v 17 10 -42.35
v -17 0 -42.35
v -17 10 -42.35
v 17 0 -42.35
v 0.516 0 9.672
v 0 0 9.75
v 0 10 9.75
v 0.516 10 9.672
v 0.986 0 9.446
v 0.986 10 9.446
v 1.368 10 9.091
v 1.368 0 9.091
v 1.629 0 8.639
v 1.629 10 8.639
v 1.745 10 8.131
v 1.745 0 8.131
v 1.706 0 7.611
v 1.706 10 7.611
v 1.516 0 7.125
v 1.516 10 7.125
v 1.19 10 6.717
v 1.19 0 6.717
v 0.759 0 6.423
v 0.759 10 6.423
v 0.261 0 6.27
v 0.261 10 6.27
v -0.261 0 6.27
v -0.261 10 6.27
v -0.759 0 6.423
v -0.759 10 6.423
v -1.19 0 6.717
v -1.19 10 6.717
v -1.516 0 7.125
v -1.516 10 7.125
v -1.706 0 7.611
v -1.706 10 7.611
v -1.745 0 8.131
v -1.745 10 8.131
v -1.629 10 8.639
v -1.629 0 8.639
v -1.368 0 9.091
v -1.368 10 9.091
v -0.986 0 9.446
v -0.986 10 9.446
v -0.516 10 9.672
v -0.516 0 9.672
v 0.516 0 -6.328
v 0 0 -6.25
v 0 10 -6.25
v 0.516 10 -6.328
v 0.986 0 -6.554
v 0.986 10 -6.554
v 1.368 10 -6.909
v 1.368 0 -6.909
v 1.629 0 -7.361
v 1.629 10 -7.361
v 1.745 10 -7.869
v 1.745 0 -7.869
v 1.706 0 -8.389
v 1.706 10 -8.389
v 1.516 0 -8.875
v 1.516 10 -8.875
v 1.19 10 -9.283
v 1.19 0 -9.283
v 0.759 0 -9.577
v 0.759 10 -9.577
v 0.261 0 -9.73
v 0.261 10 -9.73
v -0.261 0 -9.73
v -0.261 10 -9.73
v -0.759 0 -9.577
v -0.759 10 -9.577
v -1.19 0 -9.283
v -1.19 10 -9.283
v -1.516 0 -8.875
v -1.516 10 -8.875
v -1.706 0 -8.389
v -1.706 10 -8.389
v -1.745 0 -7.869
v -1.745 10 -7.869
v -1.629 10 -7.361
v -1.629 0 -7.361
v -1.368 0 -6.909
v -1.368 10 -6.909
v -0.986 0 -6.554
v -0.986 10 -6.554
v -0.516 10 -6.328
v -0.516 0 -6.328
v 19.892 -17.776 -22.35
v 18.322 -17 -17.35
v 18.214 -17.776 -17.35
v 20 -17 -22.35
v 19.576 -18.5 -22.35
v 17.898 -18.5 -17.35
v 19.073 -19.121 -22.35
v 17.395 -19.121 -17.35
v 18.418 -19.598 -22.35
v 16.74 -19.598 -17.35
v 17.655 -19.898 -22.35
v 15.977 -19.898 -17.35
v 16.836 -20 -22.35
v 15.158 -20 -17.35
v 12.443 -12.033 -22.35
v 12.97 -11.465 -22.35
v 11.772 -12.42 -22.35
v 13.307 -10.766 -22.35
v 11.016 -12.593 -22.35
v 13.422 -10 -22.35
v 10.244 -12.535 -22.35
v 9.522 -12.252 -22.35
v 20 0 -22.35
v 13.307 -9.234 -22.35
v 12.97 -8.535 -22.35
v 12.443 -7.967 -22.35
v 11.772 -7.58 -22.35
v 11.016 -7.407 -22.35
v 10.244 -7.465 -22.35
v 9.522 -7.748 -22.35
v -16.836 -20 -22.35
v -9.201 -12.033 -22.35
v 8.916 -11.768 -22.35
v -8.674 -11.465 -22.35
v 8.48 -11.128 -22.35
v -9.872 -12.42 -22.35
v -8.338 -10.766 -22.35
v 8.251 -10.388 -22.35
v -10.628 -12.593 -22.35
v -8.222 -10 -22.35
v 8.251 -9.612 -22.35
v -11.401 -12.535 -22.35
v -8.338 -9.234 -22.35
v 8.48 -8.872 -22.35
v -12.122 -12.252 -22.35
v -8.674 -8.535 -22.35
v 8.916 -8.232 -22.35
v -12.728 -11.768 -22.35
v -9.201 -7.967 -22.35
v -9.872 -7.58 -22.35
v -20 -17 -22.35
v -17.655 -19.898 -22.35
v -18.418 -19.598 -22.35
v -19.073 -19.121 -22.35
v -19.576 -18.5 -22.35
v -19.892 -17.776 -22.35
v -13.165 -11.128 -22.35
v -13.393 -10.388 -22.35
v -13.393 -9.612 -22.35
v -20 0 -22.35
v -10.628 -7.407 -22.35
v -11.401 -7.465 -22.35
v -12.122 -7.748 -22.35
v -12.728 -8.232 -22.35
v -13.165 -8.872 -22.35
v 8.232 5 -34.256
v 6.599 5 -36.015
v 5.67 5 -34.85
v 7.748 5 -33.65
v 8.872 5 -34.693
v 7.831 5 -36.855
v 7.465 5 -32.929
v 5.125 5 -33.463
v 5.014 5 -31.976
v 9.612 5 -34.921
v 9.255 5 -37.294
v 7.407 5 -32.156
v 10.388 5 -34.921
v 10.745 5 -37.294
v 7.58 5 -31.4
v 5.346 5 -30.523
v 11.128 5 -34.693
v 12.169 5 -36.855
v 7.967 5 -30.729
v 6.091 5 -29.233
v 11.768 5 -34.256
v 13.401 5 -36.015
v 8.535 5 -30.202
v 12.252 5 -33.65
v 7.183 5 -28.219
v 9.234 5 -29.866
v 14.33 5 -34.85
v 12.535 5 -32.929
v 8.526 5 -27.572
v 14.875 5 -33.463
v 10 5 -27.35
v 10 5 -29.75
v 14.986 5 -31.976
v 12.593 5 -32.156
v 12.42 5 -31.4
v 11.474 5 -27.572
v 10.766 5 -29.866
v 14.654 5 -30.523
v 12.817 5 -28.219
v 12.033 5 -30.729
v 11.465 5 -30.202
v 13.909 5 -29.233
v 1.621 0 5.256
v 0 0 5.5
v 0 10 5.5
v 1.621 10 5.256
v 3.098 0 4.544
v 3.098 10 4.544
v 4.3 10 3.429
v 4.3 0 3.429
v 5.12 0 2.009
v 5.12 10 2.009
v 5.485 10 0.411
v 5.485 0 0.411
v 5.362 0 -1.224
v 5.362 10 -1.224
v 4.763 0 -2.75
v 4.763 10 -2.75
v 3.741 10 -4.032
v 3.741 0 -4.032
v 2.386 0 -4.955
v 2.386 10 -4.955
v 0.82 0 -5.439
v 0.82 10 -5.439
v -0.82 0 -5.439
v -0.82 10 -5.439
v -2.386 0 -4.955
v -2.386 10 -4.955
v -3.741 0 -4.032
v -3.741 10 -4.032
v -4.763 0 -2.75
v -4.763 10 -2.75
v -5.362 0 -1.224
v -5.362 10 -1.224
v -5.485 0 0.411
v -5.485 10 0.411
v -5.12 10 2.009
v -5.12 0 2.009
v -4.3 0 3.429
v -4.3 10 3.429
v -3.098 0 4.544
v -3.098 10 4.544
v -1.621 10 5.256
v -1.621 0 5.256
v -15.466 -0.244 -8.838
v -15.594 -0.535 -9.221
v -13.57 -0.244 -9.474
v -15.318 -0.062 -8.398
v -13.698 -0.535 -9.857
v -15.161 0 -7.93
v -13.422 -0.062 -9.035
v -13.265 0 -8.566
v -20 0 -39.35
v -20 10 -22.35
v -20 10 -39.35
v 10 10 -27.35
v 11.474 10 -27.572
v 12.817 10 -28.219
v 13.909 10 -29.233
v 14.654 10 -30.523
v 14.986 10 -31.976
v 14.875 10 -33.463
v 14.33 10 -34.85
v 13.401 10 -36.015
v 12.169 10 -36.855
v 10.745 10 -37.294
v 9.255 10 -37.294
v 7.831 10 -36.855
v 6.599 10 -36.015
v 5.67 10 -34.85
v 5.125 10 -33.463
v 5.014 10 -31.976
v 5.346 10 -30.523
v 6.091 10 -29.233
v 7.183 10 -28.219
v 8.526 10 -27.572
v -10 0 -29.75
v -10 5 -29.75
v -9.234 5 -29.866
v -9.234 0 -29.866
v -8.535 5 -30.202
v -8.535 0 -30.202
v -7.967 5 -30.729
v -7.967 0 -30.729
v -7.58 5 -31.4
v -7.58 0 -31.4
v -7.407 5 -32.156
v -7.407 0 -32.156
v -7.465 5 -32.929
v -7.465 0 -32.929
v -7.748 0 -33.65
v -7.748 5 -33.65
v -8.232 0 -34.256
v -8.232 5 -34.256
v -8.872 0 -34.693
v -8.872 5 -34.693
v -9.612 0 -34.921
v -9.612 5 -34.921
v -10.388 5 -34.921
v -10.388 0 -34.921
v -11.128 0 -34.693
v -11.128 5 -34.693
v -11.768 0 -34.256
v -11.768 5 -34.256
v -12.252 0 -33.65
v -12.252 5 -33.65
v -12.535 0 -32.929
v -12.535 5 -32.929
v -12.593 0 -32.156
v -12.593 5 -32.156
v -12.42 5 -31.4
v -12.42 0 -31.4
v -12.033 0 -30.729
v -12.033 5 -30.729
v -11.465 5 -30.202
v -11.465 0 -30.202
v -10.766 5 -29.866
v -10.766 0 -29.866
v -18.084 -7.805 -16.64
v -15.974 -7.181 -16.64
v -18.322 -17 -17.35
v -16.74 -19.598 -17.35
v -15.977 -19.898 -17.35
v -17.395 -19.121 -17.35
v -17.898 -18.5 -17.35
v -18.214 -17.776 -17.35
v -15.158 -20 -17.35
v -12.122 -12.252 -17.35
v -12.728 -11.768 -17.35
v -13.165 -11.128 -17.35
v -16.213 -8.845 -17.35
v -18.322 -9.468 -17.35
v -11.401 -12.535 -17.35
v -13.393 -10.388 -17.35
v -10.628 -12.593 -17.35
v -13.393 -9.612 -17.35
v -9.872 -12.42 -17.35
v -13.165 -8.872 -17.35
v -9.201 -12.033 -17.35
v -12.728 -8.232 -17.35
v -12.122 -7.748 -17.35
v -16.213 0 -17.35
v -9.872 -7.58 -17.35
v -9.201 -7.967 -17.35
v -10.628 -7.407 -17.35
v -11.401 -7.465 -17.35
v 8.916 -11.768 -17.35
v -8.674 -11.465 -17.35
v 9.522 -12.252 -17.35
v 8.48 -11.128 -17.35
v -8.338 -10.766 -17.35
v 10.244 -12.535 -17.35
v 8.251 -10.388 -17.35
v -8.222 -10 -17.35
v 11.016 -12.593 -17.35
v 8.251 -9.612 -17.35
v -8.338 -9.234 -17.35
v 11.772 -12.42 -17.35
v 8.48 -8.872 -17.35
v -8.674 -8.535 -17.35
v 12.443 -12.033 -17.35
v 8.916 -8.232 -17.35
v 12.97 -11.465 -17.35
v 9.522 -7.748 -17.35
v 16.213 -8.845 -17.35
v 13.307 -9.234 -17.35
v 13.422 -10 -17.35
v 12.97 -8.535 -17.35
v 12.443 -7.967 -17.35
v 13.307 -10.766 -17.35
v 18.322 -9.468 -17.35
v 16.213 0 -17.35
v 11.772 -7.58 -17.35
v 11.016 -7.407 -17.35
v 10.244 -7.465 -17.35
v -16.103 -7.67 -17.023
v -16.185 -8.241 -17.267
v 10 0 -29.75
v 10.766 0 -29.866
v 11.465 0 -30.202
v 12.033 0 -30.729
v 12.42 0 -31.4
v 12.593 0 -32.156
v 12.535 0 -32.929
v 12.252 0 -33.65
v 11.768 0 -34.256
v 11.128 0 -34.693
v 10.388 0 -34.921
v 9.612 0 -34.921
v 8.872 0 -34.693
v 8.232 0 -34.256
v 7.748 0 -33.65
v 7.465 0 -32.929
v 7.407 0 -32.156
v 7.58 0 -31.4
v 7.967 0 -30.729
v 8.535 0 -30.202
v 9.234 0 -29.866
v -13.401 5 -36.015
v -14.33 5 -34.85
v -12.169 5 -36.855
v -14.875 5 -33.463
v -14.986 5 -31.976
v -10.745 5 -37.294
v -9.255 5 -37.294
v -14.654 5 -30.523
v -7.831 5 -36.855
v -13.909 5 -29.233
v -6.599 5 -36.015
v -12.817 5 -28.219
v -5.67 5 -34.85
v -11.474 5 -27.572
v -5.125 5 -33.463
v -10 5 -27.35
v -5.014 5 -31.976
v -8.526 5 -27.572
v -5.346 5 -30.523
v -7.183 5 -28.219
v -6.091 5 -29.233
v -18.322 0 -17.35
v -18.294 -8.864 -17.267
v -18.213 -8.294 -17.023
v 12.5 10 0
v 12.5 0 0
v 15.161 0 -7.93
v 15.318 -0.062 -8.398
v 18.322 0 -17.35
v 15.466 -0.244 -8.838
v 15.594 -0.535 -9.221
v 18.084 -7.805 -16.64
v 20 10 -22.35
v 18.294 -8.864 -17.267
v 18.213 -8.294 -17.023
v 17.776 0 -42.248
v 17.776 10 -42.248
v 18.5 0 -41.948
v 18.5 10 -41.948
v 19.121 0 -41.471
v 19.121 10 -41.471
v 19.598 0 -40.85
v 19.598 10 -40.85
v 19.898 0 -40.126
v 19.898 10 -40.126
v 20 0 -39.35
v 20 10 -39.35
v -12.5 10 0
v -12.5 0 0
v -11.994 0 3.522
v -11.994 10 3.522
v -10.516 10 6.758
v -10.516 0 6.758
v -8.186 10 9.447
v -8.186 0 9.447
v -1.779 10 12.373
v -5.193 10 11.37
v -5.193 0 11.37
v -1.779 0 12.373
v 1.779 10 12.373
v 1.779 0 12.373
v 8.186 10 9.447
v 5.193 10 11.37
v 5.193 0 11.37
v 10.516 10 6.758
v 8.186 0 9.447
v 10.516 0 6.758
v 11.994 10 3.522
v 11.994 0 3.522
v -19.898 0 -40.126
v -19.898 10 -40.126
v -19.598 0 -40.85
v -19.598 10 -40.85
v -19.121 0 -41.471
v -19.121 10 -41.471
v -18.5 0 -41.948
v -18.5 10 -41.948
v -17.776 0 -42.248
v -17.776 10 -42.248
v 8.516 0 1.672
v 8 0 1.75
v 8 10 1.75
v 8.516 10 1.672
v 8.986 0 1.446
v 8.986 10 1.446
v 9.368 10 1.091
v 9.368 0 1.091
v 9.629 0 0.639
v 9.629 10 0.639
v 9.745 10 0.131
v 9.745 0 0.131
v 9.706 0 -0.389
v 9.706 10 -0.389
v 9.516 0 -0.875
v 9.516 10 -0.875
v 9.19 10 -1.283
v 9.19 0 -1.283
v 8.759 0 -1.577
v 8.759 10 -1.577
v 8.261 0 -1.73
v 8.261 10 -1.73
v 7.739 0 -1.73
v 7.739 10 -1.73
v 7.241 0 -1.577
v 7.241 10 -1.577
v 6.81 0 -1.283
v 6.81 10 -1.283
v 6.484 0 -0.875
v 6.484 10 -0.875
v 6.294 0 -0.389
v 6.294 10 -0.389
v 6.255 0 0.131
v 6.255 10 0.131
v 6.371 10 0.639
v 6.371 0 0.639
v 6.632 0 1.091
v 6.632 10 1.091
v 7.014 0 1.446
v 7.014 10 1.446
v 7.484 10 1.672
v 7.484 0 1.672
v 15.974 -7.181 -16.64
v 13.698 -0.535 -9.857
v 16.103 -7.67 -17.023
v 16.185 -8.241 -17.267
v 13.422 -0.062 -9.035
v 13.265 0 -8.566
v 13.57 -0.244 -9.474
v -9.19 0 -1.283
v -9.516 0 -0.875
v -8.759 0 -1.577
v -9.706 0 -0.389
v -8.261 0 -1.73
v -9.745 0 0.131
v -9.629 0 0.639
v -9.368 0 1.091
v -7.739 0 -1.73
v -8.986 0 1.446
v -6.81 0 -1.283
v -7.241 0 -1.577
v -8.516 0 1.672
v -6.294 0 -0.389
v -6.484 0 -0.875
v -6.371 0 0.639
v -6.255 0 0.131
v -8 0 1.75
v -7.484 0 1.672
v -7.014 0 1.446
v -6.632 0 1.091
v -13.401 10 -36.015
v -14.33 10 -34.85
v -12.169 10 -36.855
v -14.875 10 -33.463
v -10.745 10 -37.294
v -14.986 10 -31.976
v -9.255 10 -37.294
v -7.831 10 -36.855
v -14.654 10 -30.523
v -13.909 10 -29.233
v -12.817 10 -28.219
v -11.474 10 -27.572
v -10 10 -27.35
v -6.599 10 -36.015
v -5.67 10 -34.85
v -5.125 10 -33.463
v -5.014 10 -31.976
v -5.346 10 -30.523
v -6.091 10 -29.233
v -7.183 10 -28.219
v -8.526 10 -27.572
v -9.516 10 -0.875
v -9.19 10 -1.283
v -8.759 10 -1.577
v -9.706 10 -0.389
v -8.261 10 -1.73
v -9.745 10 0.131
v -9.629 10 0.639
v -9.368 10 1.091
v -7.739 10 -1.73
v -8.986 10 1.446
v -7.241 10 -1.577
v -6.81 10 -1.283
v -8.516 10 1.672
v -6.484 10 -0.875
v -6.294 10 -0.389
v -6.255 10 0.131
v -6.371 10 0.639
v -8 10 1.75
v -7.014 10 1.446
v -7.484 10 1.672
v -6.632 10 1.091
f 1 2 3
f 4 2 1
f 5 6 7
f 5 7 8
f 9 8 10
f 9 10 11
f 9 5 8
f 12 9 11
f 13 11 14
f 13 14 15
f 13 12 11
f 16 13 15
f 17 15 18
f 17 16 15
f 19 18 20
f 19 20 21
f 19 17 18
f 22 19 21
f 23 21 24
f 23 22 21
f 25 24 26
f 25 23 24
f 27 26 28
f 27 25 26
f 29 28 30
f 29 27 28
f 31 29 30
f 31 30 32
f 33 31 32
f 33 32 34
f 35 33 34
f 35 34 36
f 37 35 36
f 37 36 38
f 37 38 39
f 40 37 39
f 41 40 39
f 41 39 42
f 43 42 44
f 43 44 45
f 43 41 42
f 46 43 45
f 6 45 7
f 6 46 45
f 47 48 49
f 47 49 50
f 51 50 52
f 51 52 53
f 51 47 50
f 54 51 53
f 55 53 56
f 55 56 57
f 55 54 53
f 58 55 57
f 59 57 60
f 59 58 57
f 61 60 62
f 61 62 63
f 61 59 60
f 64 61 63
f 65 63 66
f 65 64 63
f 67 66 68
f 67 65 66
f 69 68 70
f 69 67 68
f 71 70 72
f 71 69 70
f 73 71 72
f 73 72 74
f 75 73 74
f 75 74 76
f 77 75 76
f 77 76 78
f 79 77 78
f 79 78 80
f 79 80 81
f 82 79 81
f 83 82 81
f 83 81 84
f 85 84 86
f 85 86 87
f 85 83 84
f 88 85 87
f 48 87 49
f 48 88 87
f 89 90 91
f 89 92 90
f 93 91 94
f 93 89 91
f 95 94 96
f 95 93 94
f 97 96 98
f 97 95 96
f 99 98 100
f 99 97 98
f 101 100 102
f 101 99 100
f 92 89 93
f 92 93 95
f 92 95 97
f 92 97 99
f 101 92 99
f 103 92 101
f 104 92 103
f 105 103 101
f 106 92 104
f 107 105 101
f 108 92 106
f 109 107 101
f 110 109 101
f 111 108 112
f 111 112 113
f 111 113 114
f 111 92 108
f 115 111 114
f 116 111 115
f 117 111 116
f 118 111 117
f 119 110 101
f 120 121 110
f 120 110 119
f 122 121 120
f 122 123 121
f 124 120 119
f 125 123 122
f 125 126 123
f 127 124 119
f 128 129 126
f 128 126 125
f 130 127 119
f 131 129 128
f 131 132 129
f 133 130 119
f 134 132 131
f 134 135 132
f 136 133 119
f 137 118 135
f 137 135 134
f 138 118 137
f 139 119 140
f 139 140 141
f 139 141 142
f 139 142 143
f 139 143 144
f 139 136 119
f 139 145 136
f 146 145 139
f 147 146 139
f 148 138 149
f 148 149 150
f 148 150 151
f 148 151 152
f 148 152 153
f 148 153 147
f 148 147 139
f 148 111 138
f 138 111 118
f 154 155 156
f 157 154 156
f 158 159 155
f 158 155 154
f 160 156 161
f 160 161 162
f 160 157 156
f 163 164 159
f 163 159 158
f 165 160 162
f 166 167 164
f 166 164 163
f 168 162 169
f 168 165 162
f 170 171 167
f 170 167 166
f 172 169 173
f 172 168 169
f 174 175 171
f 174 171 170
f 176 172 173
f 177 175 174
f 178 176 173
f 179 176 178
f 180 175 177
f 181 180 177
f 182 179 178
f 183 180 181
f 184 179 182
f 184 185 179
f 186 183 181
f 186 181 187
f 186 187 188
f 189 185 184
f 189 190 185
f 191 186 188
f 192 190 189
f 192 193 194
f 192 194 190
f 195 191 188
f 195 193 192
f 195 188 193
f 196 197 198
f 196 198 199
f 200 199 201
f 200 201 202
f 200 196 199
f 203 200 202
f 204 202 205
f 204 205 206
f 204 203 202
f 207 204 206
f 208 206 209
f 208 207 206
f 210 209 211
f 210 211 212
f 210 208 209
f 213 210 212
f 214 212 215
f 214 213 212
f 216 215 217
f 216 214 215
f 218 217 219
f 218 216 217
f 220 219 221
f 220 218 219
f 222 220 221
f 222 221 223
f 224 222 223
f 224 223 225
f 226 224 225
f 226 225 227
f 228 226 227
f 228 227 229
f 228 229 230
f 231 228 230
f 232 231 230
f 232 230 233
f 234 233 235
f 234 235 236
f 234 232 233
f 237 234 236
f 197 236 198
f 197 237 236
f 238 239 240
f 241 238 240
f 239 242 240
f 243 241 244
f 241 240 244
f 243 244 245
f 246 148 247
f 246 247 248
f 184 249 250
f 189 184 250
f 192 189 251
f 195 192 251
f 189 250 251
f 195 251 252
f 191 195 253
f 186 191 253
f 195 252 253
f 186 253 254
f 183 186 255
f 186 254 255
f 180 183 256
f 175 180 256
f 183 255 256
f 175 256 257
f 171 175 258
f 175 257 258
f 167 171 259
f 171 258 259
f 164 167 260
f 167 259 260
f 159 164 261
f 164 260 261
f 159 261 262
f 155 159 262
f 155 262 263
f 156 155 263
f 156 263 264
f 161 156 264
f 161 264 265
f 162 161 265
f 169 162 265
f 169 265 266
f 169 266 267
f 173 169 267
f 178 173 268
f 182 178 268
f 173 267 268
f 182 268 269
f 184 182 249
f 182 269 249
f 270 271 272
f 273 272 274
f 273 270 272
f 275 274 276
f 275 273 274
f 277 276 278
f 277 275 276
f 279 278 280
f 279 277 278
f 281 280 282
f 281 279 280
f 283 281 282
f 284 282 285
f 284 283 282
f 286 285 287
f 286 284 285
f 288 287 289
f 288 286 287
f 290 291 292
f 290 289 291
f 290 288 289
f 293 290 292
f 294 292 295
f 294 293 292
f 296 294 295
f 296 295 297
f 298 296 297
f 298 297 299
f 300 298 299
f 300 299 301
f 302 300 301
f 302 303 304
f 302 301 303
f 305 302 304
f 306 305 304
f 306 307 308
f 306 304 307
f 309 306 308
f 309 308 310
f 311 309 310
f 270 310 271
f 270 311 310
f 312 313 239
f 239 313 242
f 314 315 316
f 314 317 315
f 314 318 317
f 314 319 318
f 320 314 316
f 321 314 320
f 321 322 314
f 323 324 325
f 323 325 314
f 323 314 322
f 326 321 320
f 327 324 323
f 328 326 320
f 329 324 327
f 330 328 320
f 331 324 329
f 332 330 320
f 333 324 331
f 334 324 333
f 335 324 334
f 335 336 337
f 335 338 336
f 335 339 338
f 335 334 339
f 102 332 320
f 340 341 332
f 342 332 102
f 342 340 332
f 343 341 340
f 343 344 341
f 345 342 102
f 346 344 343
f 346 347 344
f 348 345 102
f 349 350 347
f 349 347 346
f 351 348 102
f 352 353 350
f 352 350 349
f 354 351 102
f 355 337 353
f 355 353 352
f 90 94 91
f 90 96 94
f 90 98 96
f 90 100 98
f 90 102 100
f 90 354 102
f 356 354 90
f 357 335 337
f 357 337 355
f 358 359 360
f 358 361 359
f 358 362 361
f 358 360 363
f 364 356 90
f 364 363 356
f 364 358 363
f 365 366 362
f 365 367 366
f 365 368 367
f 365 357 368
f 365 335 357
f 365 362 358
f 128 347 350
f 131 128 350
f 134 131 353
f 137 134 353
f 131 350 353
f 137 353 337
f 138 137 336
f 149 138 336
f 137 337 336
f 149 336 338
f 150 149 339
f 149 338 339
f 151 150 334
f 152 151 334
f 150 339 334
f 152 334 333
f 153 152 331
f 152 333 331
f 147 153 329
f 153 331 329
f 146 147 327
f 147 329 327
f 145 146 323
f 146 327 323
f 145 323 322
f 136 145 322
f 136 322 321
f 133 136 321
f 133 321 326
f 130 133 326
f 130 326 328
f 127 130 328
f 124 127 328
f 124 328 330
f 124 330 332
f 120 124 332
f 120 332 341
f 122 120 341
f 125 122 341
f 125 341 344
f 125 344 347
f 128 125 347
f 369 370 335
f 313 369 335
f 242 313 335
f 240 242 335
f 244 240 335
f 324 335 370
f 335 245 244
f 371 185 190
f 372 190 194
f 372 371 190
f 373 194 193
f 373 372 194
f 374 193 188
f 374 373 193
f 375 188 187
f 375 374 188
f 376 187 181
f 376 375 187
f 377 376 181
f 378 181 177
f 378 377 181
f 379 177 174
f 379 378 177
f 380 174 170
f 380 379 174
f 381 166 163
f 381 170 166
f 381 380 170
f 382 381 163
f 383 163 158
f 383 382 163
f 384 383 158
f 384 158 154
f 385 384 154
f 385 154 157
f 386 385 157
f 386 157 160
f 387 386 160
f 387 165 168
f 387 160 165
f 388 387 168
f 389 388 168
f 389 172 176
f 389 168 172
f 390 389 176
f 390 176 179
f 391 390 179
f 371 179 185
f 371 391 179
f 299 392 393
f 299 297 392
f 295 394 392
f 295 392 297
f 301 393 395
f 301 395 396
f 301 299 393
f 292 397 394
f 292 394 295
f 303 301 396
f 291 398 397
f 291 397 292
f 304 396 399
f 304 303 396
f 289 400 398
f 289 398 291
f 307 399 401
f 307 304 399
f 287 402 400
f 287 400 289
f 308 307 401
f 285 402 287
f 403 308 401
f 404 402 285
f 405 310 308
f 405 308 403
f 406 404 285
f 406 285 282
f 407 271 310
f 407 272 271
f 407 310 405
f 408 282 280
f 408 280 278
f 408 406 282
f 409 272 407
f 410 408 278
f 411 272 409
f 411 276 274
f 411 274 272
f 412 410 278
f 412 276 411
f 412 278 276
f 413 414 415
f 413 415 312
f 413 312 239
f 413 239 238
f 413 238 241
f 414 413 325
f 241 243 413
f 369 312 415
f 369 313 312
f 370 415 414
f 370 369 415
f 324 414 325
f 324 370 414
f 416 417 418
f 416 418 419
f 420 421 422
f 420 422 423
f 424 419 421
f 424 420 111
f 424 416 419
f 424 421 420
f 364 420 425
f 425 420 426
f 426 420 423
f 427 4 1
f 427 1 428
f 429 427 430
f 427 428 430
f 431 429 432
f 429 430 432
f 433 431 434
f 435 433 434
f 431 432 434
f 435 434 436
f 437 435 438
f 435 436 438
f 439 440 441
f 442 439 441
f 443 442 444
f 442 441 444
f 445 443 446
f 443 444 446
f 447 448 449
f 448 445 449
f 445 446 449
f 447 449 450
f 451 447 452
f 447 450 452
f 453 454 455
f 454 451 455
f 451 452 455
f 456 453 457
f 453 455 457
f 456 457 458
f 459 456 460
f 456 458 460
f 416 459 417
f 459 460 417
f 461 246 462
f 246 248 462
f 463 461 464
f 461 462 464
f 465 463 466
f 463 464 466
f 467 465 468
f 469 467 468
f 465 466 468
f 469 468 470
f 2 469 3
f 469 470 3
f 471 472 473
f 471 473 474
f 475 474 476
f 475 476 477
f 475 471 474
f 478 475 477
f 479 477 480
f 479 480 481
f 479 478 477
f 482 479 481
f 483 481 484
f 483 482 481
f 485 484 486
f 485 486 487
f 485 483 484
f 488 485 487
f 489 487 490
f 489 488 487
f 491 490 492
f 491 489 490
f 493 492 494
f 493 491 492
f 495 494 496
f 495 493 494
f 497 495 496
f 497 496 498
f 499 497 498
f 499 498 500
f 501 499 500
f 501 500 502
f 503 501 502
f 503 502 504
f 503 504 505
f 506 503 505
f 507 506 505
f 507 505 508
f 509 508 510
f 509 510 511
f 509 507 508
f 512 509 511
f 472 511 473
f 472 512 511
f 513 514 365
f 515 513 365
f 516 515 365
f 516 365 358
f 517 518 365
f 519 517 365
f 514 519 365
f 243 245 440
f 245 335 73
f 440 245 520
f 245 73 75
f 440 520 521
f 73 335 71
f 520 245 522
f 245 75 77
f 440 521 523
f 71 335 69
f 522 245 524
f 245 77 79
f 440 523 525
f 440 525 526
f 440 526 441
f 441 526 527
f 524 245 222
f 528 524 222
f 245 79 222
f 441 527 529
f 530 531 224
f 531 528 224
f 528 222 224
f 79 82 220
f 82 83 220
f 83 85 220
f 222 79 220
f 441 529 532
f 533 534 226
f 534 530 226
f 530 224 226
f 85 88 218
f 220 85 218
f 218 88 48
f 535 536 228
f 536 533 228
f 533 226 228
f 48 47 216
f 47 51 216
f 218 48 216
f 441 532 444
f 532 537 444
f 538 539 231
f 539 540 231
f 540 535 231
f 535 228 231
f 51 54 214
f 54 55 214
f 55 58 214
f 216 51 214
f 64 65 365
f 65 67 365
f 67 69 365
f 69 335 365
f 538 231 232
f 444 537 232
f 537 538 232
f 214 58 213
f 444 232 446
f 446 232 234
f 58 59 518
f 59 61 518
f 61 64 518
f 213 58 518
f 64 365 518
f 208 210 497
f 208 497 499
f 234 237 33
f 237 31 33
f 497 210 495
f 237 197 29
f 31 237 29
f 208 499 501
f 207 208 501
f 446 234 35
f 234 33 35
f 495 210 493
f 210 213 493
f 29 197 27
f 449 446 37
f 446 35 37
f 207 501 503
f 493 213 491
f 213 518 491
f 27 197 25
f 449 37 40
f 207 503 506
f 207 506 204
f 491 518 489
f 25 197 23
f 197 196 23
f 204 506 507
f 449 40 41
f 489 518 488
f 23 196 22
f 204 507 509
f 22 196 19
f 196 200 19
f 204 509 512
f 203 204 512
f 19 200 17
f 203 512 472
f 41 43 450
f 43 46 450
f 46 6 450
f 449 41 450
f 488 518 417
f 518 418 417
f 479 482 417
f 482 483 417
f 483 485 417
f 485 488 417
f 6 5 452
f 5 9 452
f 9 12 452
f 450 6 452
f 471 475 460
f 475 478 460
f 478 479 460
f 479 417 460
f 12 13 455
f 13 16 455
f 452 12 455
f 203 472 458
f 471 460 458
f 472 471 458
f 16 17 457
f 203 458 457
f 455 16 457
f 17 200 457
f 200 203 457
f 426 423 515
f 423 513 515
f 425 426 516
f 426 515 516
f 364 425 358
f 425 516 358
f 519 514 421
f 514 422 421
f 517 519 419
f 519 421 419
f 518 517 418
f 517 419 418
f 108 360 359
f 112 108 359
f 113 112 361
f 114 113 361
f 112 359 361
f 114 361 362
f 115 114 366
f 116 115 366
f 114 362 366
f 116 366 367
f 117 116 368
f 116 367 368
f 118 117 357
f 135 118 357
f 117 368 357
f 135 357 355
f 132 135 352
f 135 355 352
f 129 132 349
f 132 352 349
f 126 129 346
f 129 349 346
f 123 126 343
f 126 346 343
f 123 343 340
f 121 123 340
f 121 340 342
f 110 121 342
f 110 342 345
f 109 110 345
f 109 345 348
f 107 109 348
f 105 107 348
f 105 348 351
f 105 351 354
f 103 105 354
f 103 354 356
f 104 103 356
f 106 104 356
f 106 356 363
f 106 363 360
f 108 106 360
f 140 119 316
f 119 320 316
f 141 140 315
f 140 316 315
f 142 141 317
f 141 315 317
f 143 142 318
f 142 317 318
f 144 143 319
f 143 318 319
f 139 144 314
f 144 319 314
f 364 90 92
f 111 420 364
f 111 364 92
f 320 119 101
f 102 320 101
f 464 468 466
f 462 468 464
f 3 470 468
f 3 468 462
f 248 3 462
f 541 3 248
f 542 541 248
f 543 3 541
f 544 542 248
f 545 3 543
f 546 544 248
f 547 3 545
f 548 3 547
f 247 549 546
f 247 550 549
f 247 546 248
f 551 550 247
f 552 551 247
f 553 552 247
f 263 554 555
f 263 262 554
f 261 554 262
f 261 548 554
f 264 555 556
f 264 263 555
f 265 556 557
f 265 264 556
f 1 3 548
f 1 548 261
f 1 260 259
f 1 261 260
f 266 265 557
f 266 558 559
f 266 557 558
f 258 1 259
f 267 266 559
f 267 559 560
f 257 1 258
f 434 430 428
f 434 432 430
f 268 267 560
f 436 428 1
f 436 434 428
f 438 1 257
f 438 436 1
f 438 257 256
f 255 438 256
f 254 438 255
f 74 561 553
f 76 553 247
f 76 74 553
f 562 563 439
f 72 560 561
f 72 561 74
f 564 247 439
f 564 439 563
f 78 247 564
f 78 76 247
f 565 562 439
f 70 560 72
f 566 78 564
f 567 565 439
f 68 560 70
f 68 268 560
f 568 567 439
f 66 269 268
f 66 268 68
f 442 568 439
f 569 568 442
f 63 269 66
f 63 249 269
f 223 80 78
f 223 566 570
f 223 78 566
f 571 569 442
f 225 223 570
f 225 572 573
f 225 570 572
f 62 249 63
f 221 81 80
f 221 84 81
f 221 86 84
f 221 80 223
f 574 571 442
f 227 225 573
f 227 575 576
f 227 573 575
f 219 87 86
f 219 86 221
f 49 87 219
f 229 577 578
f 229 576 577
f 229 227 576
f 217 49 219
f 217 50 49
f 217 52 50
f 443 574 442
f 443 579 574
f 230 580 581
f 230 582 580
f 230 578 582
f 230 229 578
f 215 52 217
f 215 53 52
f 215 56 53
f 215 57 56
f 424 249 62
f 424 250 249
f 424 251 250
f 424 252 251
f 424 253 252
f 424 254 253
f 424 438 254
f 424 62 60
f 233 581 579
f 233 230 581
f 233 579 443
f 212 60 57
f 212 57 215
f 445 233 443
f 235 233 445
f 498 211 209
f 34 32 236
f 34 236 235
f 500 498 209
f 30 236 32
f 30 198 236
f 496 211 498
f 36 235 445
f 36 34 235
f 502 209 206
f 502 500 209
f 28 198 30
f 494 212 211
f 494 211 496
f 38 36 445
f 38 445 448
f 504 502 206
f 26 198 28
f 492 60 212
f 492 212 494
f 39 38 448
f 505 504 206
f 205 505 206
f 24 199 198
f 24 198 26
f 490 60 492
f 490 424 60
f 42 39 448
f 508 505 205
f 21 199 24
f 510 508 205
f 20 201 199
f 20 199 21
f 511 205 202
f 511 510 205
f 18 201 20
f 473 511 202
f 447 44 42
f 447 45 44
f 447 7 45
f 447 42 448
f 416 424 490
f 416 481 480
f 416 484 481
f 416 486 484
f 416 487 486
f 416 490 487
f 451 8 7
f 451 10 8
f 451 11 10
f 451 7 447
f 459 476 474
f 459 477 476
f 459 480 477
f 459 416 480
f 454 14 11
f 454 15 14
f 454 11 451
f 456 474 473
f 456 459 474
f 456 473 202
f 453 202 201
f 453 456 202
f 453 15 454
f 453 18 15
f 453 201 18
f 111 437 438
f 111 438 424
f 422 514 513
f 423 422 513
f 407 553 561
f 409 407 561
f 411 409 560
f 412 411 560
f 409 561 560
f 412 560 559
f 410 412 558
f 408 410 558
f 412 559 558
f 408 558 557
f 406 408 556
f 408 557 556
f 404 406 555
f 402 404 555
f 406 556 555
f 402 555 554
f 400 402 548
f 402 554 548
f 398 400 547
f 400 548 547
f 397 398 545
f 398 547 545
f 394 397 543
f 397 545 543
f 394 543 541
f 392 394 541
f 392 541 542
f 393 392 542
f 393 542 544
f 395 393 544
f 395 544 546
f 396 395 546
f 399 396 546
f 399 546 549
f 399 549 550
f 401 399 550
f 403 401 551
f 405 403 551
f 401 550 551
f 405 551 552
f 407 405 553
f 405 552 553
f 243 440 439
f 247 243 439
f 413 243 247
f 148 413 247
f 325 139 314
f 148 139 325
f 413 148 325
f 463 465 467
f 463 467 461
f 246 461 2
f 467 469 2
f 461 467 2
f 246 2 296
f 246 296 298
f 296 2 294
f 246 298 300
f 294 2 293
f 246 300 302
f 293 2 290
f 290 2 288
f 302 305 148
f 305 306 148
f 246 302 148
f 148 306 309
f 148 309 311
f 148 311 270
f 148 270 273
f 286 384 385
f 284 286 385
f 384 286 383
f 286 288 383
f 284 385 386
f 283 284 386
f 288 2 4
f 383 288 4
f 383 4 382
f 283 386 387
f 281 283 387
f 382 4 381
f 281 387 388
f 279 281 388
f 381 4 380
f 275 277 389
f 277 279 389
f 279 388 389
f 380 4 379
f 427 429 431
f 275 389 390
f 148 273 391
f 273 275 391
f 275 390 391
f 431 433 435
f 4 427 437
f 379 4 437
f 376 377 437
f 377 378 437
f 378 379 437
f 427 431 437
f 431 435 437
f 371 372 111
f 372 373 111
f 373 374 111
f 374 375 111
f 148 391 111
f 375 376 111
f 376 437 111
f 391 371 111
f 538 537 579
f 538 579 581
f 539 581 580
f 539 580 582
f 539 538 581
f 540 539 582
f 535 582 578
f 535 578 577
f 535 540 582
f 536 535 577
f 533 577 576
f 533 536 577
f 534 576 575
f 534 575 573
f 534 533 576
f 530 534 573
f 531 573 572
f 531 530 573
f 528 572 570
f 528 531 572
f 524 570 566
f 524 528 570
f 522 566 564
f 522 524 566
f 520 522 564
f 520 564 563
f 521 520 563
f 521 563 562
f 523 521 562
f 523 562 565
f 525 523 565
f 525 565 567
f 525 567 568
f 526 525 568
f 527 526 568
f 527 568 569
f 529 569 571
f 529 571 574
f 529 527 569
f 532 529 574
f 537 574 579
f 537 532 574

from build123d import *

# Parameters (mm, degrees)
SKETCH1_R           = 12.5
SKETCH1_R_2         = 5.5
SKETCH1_R_3         = 1.75
BOSS_EXTRUDE1_DEPTH = 10
SKETCH3_R           = 2.6
BOSS_EXTRUDE2_DEPTH = 10
BOSS_EXTRUDE3_DEPTH = 20
SKETCH5_R           = 2.6
CUT_EXTRUDE1_DEPTH  = 42.122043967
FILLET3_R           = 3
FILLET4_R           = 3
RIB1_REACH          = 61.183
SKETCH6_WALL_W      = 132.856077754
SKETCH6_WALL_H      = 2
FILLET6_R           = 2
RIB2_REACH          = 61.183
SKETCH7_WALL_W      = 132.856077754
SKETCH7_WALL_H      = 2
FILLET7_R           = 2
SKETCH8_R           = 5
CUT_EXTRUDE2_DEPTH  = 5


with BuildPart() as part:
    # Sketch1 → Boss-Extrude1 (new body)
    with BuildSketch(Plane(origin=(0, 0, 0), x_dir=(1, 0, 0), z_dir=(0, 1, 0))):
        Circle(SKETCH1_R)
        Circle(SKETCH1_R_2, mode=Mode.SUBTRACT)
        with Locations((0, 8)):
            Circle(SKETCH1_R_3, mode=Mode.SUBTRACT)
        with Locations((8, 0)):
            Circle(SKETCH1_R_3, mode=Mode.SUBTRACT)
        with Locations((0, -8)):
            Circle(SKETCH1_R_3, mode=Mode.SUBTRACT)
        with Locations((-8, 0)):
            Circle(SKETCH1_R_3, mode=Mode.SUBTRACT)
    extrude(amount=BOSS_EXTRUDE1_DEPTH)

    # Sketch3 → Boss-Extrude2 (add)
    with BuildSketch(Plane(origin=(0, 0, 0), x_dir=(1, 0, 0), z_dir=(0, 1, 0))):
        with BuildLine():
            Line((-12.5, 0), (-20, 22.35))
            Line((-20, 22.35), (-20, 42.35))
            Line((-20, 42.35), (20, 42.35))
            Line((20, 42.35), (20, 22.35))
            Line((20, 22.35), (12.5, 0))
            ThreePointArc((12.5, 0), (0, 12.5), (-12.5, 0))
        make_face()
        with Locations((-10, 32.35)):
            Circle(SKETCH3_R, mode=Mode.SUBTRACT)
        with Locations((10, 32.35)):
            Circle(SKETCH3_R, mode=Mode.SUBTRACT)
    extrude(amount=BOSS_EXTRUDE2_DEPTH)

    # Sketch4 → Boss-Extrude3 (add)
    with BuildSketch(Plane(origin=(0, 0, 0), x_dir=(1, 0, 0), z_dir=(0, 1, 0))):
        Polygon((20, 22.35), (-20, 22.35), (-18.322147651, 17.35), (18.322147651, 17.35), align=None)
    extrude(amount=-BOSS_EXTRUDE3_DEPTH)

    # Sketch5 → Cut-Extrude1 (cut, through all)
    with BuildSketch(Plane.XY.offset(-17.35)):
        with Locations((-10.822147651, -10)):
            Circle(SKETCH5_R)
        with Locations((10.822147651, -10)):
            Circle(SKETCH5_R)
    extrude(amount=-CUT_EXTRUDE1_DEPTH, mode=Mode.SUBTRACT)

    # Fillet3
    fillet3_edges = [part.edges().sort_by_distance(p)[0] for p in [
        (19.161073826, -20, -19.85),
        (-19.161073826, -20, -19.85),
    ]]
    fillet(fillet3_edges, radius=FILLET3_R)

    # Fillet4
    fillet4_edges = [part.edges().sort_by_distance(p)[0] for p in [
        (20, 5, -42.35),
        (-20, 5, -42.35),
    ]]
    fillet(fillet4_edges, radius=FILLET4_R)

    # Sketch6 wall → Rib1 (add, up to next)
    with BuildSketch(Plane(origin=(-16.866610739, -4.25, -13.0125), x_dir=(0.233087398642, 0.680588335288, 0.694600448074), z_dir=(-0.216519610858, 0.732666034336, -0.645228440356)), mode=Mode.PRIVATE) as rib1_sk1:
        with Locations((0, 1)):
            Rectangle(SKETCH6_WALL_W, SKETCH6_WALL_H)
    rib1_tool1 = extrude(rib1_sk1.sketch, amount=RIB1_REACH, mode=Mode.PRIVATE) - part.part
    add(rib1_tool1.solids().sort_by_distance((-16.866610739, -4.25, -13.0125))[0])

    # Fillet6
    fillet6_edges = [part.edges().sort_by_distance(p)[0] for p in [
        (-17.267345518, -8.188281786, -17.35),
        (-14.463028721, 0, -8.993135942),
    ]]
    fillet(fillet6_edges, radius=FILLET6_R)

    # Sketch7 wall → Rib2 (add, up to next)
    with BuildSketch(Plane(origin=(16.866610739, -4.25, -13.0125), x_dir=(-0.233087398642, 0.680588335288, 0.694600448074), z_dir=(-0.216519610858, -0.732666034336, 0.645228440356)), mode=Mode.PRIVATE) as rib2_sk1:
        with Locations((0, 1)):
            Rectangle(SKETCH7_WALL_W, SKETCH7_WALL_H)
    rib2_tool1 = extrude(rib2_sk1.sketch, amount=-RIB2_REACH, mode=Mode.PRIVATE) - part.part
    add(rib2_tool1.solids().sort_by_distance((16.866610739, -4.25, -13.0125))[0])

    # Fillet7
    fillet7_edges = [part.edges().sort_by_distance(p)[0] for p in [
        (17.267345518, -8.188281786, -17.35),
        (14.463028721, 0, -8.993135942),
    ]]
    fillet(fillet7_edges, radius=FILLET7_R)

    # Sketch8 → Cut-Extrude2 (cut)
    with BuildSketch(Plane(origin=(0, 10, 0), x_dir=(1, 0, 0), z_dir=(0, 1, 0))):
        with Locations((-10, 32.35)):
            Circle(SKETCH8_R)
        with Locations((10, 32.35)):
            Circle(SKETCH8_R)
    extrude(amount=-CUT_EXTRUDE2_DEPTH, mode=Mode.SUBTRACT)


solid = part.part
